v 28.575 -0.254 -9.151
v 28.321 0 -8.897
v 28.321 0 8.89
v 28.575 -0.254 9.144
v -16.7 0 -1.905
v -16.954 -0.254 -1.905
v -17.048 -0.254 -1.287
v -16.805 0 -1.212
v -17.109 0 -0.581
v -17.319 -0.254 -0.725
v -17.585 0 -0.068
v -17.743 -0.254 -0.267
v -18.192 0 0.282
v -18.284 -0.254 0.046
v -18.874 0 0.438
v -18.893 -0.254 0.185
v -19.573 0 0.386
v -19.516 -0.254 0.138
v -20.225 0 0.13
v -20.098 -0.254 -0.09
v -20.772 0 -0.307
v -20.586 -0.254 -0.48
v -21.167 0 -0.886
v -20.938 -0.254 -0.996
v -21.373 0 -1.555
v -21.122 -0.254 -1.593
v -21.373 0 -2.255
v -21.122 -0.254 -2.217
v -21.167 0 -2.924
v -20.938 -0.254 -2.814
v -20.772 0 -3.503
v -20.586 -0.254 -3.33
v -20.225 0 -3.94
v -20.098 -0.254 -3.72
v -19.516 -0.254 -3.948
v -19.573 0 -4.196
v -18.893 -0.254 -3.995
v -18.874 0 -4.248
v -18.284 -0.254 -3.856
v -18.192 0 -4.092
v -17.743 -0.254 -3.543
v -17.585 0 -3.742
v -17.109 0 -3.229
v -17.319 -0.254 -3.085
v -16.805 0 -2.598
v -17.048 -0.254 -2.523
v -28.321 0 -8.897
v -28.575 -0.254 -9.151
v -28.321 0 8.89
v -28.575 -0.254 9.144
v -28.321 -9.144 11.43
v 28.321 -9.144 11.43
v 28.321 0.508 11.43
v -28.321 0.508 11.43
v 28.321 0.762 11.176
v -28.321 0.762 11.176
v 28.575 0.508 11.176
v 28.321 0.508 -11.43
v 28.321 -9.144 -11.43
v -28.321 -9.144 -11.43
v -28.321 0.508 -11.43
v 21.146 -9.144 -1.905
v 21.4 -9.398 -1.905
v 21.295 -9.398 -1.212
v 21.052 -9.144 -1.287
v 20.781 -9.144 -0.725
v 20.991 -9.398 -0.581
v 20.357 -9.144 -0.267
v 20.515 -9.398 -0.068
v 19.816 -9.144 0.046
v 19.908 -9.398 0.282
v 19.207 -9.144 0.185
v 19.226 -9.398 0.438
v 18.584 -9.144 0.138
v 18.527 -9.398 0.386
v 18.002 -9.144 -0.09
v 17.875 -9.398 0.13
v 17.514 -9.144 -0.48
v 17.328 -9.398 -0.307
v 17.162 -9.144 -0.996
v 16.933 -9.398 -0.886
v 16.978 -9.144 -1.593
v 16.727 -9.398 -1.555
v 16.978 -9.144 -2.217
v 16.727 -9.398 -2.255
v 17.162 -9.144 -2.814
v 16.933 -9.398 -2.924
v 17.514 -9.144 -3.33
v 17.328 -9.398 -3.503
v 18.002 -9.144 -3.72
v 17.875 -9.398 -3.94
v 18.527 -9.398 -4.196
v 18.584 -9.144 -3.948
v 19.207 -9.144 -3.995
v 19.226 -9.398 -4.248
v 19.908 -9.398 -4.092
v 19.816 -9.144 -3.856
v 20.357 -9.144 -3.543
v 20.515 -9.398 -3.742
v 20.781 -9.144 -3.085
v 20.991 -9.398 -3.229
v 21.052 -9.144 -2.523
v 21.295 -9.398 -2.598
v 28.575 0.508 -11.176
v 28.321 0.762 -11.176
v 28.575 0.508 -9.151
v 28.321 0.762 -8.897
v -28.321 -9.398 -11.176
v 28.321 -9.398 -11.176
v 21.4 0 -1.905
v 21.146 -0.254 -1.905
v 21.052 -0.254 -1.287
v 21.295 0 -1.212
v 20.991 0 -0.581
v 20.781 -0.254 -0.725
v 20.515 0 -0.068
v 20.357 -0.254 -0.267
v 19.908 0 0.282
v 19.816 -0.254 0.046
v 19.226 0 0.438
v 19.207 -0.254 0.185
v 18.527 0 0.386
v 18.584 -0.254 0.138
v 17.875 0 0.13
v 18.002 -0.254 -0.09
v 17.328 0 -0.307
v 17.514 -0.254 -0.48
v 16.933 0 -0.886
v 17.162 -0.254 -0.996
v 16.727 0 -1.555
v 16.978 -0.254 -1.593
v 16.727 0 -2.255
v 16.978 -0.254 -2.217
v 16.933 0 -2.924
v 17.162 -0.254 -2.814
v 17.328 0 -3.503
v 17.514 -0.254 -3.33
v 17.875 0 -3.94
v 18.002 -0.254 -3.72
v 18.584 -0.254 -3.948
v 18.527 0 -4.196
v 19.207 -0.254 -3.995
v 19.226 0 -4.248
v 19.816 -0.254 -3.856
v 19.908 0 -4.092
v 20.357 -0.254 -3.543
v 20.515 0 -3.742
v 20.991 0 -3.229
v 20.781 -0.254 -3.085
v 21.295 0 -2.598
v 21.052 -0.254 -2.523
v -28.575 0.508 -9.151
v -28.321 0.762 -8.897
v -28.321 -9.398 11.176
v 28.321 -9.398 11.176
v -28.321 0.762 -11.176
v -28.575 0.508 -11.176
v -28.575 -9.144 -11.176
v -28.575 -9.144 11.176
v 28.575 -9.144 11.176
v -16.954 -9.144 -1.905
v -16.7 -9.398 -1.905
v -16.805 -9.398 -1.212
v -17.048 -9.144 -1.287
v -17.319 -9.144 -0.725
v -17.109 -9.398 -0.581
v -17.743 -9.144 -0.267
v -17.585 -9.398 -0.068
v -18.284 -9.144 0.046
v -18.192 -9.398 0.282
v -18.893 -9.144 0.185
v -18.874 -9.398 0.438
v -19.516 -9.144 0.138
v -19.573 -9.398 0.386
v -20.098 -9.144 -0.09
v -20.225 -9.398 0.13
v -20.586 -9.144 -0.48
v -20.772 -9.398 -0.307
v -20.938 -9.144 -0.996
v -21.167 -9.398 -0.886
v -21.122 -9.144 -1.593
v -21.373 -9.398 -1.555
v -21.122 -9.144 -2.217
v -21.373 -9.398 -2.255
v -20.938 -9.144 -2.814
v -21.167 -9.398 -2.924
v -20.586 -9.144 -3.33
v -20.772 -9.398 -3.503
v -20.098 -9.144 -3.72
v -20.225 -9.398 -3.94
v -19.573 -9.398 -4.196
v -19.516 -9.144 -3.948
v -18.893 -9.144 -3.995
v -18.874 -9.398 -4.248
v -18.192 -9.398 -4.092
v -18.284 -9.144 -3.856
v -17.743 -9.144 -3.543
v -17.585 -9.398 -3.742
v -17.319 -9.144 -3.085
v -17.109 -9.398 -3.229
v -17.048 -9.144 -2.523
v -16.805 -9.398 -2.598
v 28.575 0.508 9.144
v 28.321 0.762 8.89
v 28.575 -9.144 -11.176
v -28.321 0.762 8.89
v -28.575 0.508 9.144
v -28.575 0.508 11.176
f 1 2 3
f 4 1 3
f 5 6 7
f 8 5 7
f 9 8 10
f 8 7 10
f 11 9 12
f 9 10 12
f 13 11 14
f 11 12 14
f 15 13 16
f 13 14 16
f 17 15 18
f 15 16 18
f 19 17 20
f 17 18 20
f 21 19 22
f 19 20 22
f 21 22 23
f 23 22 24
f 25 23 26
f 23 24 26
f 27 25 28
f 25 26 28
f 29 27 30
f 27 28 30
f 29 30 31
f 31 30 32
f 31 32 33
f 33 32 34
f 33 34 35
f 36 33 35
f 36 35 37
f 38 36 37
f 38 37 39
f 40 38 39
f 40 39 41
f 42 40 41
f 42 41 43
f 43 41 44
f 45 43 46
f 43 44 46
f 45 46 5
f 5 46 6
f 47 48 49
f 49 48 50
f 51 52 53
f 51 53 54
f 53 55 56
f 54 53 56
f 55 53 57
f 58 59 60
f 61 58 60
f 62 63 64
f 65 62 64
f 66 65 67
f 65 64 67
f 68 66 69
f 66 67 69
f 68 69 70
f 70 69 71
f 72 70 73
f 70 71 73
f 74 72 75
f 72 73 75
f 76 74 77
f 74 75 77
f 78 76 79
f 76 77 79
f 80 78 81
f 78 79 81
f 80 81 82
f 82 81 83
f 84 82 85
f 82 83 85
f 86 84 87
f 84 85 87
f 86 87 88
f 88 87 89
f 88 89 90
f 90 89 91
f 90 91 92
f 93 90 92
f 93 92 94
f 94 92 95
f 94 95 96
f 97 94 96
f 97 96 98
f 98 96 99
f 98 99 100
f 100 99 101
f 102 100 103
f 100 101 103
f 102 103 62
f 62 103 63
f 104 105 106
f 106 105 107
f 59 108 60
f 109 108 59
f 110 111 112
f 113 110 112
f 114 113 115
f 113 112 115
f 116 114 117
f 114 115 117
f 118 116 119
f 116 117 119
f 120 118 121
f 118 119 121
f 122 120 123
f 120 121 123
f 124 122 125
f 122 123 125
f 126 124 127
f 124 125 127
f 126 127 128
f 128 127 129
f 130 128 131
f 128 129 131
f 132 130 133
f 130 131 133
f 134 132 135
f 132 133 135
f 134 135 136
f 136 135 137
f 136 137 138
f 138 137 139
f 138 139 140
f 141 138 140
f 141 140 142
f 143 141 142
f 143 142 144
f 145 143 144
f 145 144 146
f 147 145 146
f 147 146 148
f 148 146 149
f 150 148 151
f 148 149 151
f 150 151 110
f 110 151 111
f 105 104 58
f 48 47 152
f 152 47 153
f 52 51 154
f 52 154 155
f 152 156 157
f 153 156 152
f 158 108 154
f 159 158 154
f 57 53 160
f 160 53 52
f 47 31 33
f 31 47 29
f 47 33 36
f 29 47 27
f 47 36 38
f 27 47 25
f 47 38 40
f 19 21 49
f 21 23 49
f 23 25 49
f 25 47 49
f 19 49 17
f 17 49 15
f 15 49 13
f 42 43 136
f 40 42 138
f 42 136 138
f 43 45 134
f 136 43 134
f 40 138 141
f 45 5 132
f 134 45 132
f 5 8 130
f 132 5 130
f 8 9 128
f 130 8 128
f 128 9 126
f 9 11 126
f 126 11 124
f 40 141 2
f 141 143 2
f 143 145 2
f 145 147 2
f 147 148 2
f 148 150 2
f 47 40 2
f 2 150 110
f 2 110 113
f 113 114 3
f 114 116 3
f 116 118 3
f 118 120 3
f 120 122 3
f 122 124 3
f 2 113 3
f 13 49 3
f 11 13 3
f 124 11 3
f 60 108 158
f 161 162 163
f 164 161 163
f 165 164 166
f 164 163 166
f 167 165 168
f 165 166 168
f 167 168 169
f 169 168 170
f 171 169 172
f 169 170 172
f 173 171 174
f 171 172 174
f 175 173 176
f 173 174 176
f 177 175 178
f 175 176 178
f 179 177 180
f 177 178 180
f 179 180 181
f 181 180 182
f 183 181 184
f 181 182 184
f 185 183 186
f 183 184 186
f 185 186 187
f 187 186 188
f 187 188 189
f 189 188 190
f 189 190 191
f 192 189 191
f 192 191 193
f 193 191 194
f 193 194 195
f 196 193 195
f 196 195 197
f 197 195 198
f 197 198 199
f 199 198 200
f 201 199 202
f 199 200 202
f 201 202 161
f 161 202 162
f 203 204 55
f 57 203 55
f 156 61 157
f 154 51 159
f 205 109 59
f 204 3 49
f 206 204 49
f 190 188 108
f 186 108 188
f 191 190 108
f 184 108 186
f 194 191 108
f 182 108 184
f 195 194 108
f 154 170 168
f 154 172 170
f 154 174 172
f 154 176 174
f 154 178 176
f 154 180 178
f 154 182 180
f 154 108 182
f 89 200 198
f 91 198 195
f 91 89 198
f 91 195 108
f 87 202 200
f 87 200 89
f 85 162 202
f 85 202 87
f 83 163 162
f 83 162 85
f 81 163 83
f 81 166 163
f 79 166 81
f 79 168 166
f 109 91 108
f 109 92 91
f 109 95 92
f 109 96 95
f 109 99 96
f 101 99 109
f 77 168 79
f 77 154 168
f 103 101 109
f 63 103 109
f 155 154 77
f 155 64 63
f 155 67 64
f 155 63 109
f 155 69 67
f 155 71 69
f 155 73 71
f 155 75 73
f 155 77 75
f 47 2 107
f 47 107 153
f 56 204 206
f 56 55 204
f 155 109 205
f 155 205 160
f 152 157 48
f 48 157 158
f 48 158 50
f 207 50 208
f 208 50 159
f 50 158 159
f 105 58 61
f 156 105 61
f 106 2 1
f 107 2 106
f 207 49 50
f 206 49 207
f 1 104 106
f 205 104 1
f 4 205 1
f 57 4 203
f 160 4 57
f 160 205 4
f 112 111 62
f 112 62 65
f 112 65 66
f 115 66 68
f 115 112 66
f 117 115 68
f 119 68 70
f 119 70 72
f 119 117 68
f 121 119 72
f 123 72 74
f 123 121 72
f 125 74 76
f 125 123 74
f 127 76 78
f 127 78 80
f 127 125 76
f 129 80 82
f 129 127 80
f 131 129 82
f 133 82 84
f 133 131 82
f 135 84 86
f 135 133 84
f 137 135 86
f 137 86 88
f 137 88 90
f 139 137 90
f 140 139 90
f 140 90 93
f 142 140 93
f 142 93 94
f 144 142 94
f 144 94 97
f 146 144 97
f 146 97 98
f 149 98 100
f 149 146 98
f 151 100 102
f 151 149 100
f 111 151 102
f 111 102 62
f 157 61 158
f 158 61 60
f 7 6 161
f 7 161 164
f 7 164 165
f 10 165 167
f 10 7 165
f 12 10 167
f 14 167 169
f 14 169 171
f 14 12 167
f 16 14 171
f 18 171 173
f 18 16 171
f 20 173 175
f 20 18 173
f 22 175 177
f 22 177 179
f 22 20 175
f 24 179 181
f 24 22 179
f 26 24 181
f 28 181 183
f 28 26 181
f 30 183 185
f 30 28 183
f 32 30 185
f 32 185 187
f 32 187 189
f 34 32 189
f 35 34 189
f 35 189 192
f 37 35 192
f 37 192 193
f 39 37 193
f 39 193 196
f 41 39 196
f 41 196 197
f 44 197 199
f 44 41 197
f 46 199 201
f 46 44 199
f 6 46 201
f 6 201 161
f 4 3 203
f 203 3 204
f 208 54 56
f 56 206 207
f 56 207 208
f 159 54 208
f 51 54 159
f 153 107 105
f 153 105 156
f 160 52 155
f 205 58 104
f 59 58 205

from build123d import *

# Parameters (mm, degrees)
F0_W     = 57.15
F0_H     = 22.86
F0_R     = 2.0955
F1_DEPTH = 9.398
F2_W     = 57.15
F2_H     = 2.5331471565
F3_DEPTH = 0.762
F4_W     = 57.15
F4_H     = 2.54
F5_DEPTH = 0.762
F6_SIZE  = 0.254


with BuildPart() as f1:
    # F0 (on Front) → F1 (new body)
    with BuildSketch(Plane.XZ):
        Rectangle(F0_W, F0_H)
        with Locations((-19.05, -1.905)):
            Circle(F0_R, mode=Mode.SUBTRACT)
        with Locations((19.05, -1.905)):
            Circle(F0_R, mode=Mode.SUBTRACT)
    extrude(amount=F1_DEPTH)

    # F2 (on face) → F3 (join)
    with BuildSketch(Plane(origin=(0, 0, 0), x_dir=(-1, 0, 0), z_dir=(0, 1, 0))):
        with Locations((0, -10.1634264217)):
            Rectangle(F2_W, F2_H)
    extrude(amount=F3_DEPTH)

    # F4 (on face) → F5 (join)
    with BuildSketch(Plane(origin=(0, 0, 0), x_dir=(-1, 0, 0), z_dir=(0, 1, 0))):
        with Locations((0, 10.16)):
            Rectangle(F4_W, F4_H)
    extrude(amount=F5_DEPTH)

    # F6
    f6_edges = [f1.edges().sort_by_distance(p)[0] for p in [
        (28.575, 0, -0.003426),
        (-28.575, -4.318, 11.43),
        (28.575, -4.318, 11.43),
        (0, 0.762, 11.43),
        (-21.1455, -9.398, -1.905),
        (16.9545, -9.398, -1.905),
        (0, -9.398, -11.43),
        (0, -9.398, 11.43),
        (28.575, -9.398, 0),
        (-28.575, -9.398, 0),
        (28.575, -4.318, -11.43),
        (-28.575, 0, -0.003426),
        (28.575, 0.762, 10.16),
        (28.575, 0.381, 8.89),
        (-28.575, -4.318, -11.43),
        (16.9545, 0, -1.905),
        (28.575, 0.381, -8.896853),
        (-21.1455, 0, -1.905),
        (28.575, 0.762, -10.163426),
        (0, 0.762, -11.43),
        (-28.575, 0.762, 10.16),
        (-28.575, 0.381, 8.89),
        (-28.575, 0.762, -10.163426),
        (-28.575, 0.381, -8.896853),
    ]]
    chamfer(f6_edges, length=F6_SIZE)


solid = f1.part
